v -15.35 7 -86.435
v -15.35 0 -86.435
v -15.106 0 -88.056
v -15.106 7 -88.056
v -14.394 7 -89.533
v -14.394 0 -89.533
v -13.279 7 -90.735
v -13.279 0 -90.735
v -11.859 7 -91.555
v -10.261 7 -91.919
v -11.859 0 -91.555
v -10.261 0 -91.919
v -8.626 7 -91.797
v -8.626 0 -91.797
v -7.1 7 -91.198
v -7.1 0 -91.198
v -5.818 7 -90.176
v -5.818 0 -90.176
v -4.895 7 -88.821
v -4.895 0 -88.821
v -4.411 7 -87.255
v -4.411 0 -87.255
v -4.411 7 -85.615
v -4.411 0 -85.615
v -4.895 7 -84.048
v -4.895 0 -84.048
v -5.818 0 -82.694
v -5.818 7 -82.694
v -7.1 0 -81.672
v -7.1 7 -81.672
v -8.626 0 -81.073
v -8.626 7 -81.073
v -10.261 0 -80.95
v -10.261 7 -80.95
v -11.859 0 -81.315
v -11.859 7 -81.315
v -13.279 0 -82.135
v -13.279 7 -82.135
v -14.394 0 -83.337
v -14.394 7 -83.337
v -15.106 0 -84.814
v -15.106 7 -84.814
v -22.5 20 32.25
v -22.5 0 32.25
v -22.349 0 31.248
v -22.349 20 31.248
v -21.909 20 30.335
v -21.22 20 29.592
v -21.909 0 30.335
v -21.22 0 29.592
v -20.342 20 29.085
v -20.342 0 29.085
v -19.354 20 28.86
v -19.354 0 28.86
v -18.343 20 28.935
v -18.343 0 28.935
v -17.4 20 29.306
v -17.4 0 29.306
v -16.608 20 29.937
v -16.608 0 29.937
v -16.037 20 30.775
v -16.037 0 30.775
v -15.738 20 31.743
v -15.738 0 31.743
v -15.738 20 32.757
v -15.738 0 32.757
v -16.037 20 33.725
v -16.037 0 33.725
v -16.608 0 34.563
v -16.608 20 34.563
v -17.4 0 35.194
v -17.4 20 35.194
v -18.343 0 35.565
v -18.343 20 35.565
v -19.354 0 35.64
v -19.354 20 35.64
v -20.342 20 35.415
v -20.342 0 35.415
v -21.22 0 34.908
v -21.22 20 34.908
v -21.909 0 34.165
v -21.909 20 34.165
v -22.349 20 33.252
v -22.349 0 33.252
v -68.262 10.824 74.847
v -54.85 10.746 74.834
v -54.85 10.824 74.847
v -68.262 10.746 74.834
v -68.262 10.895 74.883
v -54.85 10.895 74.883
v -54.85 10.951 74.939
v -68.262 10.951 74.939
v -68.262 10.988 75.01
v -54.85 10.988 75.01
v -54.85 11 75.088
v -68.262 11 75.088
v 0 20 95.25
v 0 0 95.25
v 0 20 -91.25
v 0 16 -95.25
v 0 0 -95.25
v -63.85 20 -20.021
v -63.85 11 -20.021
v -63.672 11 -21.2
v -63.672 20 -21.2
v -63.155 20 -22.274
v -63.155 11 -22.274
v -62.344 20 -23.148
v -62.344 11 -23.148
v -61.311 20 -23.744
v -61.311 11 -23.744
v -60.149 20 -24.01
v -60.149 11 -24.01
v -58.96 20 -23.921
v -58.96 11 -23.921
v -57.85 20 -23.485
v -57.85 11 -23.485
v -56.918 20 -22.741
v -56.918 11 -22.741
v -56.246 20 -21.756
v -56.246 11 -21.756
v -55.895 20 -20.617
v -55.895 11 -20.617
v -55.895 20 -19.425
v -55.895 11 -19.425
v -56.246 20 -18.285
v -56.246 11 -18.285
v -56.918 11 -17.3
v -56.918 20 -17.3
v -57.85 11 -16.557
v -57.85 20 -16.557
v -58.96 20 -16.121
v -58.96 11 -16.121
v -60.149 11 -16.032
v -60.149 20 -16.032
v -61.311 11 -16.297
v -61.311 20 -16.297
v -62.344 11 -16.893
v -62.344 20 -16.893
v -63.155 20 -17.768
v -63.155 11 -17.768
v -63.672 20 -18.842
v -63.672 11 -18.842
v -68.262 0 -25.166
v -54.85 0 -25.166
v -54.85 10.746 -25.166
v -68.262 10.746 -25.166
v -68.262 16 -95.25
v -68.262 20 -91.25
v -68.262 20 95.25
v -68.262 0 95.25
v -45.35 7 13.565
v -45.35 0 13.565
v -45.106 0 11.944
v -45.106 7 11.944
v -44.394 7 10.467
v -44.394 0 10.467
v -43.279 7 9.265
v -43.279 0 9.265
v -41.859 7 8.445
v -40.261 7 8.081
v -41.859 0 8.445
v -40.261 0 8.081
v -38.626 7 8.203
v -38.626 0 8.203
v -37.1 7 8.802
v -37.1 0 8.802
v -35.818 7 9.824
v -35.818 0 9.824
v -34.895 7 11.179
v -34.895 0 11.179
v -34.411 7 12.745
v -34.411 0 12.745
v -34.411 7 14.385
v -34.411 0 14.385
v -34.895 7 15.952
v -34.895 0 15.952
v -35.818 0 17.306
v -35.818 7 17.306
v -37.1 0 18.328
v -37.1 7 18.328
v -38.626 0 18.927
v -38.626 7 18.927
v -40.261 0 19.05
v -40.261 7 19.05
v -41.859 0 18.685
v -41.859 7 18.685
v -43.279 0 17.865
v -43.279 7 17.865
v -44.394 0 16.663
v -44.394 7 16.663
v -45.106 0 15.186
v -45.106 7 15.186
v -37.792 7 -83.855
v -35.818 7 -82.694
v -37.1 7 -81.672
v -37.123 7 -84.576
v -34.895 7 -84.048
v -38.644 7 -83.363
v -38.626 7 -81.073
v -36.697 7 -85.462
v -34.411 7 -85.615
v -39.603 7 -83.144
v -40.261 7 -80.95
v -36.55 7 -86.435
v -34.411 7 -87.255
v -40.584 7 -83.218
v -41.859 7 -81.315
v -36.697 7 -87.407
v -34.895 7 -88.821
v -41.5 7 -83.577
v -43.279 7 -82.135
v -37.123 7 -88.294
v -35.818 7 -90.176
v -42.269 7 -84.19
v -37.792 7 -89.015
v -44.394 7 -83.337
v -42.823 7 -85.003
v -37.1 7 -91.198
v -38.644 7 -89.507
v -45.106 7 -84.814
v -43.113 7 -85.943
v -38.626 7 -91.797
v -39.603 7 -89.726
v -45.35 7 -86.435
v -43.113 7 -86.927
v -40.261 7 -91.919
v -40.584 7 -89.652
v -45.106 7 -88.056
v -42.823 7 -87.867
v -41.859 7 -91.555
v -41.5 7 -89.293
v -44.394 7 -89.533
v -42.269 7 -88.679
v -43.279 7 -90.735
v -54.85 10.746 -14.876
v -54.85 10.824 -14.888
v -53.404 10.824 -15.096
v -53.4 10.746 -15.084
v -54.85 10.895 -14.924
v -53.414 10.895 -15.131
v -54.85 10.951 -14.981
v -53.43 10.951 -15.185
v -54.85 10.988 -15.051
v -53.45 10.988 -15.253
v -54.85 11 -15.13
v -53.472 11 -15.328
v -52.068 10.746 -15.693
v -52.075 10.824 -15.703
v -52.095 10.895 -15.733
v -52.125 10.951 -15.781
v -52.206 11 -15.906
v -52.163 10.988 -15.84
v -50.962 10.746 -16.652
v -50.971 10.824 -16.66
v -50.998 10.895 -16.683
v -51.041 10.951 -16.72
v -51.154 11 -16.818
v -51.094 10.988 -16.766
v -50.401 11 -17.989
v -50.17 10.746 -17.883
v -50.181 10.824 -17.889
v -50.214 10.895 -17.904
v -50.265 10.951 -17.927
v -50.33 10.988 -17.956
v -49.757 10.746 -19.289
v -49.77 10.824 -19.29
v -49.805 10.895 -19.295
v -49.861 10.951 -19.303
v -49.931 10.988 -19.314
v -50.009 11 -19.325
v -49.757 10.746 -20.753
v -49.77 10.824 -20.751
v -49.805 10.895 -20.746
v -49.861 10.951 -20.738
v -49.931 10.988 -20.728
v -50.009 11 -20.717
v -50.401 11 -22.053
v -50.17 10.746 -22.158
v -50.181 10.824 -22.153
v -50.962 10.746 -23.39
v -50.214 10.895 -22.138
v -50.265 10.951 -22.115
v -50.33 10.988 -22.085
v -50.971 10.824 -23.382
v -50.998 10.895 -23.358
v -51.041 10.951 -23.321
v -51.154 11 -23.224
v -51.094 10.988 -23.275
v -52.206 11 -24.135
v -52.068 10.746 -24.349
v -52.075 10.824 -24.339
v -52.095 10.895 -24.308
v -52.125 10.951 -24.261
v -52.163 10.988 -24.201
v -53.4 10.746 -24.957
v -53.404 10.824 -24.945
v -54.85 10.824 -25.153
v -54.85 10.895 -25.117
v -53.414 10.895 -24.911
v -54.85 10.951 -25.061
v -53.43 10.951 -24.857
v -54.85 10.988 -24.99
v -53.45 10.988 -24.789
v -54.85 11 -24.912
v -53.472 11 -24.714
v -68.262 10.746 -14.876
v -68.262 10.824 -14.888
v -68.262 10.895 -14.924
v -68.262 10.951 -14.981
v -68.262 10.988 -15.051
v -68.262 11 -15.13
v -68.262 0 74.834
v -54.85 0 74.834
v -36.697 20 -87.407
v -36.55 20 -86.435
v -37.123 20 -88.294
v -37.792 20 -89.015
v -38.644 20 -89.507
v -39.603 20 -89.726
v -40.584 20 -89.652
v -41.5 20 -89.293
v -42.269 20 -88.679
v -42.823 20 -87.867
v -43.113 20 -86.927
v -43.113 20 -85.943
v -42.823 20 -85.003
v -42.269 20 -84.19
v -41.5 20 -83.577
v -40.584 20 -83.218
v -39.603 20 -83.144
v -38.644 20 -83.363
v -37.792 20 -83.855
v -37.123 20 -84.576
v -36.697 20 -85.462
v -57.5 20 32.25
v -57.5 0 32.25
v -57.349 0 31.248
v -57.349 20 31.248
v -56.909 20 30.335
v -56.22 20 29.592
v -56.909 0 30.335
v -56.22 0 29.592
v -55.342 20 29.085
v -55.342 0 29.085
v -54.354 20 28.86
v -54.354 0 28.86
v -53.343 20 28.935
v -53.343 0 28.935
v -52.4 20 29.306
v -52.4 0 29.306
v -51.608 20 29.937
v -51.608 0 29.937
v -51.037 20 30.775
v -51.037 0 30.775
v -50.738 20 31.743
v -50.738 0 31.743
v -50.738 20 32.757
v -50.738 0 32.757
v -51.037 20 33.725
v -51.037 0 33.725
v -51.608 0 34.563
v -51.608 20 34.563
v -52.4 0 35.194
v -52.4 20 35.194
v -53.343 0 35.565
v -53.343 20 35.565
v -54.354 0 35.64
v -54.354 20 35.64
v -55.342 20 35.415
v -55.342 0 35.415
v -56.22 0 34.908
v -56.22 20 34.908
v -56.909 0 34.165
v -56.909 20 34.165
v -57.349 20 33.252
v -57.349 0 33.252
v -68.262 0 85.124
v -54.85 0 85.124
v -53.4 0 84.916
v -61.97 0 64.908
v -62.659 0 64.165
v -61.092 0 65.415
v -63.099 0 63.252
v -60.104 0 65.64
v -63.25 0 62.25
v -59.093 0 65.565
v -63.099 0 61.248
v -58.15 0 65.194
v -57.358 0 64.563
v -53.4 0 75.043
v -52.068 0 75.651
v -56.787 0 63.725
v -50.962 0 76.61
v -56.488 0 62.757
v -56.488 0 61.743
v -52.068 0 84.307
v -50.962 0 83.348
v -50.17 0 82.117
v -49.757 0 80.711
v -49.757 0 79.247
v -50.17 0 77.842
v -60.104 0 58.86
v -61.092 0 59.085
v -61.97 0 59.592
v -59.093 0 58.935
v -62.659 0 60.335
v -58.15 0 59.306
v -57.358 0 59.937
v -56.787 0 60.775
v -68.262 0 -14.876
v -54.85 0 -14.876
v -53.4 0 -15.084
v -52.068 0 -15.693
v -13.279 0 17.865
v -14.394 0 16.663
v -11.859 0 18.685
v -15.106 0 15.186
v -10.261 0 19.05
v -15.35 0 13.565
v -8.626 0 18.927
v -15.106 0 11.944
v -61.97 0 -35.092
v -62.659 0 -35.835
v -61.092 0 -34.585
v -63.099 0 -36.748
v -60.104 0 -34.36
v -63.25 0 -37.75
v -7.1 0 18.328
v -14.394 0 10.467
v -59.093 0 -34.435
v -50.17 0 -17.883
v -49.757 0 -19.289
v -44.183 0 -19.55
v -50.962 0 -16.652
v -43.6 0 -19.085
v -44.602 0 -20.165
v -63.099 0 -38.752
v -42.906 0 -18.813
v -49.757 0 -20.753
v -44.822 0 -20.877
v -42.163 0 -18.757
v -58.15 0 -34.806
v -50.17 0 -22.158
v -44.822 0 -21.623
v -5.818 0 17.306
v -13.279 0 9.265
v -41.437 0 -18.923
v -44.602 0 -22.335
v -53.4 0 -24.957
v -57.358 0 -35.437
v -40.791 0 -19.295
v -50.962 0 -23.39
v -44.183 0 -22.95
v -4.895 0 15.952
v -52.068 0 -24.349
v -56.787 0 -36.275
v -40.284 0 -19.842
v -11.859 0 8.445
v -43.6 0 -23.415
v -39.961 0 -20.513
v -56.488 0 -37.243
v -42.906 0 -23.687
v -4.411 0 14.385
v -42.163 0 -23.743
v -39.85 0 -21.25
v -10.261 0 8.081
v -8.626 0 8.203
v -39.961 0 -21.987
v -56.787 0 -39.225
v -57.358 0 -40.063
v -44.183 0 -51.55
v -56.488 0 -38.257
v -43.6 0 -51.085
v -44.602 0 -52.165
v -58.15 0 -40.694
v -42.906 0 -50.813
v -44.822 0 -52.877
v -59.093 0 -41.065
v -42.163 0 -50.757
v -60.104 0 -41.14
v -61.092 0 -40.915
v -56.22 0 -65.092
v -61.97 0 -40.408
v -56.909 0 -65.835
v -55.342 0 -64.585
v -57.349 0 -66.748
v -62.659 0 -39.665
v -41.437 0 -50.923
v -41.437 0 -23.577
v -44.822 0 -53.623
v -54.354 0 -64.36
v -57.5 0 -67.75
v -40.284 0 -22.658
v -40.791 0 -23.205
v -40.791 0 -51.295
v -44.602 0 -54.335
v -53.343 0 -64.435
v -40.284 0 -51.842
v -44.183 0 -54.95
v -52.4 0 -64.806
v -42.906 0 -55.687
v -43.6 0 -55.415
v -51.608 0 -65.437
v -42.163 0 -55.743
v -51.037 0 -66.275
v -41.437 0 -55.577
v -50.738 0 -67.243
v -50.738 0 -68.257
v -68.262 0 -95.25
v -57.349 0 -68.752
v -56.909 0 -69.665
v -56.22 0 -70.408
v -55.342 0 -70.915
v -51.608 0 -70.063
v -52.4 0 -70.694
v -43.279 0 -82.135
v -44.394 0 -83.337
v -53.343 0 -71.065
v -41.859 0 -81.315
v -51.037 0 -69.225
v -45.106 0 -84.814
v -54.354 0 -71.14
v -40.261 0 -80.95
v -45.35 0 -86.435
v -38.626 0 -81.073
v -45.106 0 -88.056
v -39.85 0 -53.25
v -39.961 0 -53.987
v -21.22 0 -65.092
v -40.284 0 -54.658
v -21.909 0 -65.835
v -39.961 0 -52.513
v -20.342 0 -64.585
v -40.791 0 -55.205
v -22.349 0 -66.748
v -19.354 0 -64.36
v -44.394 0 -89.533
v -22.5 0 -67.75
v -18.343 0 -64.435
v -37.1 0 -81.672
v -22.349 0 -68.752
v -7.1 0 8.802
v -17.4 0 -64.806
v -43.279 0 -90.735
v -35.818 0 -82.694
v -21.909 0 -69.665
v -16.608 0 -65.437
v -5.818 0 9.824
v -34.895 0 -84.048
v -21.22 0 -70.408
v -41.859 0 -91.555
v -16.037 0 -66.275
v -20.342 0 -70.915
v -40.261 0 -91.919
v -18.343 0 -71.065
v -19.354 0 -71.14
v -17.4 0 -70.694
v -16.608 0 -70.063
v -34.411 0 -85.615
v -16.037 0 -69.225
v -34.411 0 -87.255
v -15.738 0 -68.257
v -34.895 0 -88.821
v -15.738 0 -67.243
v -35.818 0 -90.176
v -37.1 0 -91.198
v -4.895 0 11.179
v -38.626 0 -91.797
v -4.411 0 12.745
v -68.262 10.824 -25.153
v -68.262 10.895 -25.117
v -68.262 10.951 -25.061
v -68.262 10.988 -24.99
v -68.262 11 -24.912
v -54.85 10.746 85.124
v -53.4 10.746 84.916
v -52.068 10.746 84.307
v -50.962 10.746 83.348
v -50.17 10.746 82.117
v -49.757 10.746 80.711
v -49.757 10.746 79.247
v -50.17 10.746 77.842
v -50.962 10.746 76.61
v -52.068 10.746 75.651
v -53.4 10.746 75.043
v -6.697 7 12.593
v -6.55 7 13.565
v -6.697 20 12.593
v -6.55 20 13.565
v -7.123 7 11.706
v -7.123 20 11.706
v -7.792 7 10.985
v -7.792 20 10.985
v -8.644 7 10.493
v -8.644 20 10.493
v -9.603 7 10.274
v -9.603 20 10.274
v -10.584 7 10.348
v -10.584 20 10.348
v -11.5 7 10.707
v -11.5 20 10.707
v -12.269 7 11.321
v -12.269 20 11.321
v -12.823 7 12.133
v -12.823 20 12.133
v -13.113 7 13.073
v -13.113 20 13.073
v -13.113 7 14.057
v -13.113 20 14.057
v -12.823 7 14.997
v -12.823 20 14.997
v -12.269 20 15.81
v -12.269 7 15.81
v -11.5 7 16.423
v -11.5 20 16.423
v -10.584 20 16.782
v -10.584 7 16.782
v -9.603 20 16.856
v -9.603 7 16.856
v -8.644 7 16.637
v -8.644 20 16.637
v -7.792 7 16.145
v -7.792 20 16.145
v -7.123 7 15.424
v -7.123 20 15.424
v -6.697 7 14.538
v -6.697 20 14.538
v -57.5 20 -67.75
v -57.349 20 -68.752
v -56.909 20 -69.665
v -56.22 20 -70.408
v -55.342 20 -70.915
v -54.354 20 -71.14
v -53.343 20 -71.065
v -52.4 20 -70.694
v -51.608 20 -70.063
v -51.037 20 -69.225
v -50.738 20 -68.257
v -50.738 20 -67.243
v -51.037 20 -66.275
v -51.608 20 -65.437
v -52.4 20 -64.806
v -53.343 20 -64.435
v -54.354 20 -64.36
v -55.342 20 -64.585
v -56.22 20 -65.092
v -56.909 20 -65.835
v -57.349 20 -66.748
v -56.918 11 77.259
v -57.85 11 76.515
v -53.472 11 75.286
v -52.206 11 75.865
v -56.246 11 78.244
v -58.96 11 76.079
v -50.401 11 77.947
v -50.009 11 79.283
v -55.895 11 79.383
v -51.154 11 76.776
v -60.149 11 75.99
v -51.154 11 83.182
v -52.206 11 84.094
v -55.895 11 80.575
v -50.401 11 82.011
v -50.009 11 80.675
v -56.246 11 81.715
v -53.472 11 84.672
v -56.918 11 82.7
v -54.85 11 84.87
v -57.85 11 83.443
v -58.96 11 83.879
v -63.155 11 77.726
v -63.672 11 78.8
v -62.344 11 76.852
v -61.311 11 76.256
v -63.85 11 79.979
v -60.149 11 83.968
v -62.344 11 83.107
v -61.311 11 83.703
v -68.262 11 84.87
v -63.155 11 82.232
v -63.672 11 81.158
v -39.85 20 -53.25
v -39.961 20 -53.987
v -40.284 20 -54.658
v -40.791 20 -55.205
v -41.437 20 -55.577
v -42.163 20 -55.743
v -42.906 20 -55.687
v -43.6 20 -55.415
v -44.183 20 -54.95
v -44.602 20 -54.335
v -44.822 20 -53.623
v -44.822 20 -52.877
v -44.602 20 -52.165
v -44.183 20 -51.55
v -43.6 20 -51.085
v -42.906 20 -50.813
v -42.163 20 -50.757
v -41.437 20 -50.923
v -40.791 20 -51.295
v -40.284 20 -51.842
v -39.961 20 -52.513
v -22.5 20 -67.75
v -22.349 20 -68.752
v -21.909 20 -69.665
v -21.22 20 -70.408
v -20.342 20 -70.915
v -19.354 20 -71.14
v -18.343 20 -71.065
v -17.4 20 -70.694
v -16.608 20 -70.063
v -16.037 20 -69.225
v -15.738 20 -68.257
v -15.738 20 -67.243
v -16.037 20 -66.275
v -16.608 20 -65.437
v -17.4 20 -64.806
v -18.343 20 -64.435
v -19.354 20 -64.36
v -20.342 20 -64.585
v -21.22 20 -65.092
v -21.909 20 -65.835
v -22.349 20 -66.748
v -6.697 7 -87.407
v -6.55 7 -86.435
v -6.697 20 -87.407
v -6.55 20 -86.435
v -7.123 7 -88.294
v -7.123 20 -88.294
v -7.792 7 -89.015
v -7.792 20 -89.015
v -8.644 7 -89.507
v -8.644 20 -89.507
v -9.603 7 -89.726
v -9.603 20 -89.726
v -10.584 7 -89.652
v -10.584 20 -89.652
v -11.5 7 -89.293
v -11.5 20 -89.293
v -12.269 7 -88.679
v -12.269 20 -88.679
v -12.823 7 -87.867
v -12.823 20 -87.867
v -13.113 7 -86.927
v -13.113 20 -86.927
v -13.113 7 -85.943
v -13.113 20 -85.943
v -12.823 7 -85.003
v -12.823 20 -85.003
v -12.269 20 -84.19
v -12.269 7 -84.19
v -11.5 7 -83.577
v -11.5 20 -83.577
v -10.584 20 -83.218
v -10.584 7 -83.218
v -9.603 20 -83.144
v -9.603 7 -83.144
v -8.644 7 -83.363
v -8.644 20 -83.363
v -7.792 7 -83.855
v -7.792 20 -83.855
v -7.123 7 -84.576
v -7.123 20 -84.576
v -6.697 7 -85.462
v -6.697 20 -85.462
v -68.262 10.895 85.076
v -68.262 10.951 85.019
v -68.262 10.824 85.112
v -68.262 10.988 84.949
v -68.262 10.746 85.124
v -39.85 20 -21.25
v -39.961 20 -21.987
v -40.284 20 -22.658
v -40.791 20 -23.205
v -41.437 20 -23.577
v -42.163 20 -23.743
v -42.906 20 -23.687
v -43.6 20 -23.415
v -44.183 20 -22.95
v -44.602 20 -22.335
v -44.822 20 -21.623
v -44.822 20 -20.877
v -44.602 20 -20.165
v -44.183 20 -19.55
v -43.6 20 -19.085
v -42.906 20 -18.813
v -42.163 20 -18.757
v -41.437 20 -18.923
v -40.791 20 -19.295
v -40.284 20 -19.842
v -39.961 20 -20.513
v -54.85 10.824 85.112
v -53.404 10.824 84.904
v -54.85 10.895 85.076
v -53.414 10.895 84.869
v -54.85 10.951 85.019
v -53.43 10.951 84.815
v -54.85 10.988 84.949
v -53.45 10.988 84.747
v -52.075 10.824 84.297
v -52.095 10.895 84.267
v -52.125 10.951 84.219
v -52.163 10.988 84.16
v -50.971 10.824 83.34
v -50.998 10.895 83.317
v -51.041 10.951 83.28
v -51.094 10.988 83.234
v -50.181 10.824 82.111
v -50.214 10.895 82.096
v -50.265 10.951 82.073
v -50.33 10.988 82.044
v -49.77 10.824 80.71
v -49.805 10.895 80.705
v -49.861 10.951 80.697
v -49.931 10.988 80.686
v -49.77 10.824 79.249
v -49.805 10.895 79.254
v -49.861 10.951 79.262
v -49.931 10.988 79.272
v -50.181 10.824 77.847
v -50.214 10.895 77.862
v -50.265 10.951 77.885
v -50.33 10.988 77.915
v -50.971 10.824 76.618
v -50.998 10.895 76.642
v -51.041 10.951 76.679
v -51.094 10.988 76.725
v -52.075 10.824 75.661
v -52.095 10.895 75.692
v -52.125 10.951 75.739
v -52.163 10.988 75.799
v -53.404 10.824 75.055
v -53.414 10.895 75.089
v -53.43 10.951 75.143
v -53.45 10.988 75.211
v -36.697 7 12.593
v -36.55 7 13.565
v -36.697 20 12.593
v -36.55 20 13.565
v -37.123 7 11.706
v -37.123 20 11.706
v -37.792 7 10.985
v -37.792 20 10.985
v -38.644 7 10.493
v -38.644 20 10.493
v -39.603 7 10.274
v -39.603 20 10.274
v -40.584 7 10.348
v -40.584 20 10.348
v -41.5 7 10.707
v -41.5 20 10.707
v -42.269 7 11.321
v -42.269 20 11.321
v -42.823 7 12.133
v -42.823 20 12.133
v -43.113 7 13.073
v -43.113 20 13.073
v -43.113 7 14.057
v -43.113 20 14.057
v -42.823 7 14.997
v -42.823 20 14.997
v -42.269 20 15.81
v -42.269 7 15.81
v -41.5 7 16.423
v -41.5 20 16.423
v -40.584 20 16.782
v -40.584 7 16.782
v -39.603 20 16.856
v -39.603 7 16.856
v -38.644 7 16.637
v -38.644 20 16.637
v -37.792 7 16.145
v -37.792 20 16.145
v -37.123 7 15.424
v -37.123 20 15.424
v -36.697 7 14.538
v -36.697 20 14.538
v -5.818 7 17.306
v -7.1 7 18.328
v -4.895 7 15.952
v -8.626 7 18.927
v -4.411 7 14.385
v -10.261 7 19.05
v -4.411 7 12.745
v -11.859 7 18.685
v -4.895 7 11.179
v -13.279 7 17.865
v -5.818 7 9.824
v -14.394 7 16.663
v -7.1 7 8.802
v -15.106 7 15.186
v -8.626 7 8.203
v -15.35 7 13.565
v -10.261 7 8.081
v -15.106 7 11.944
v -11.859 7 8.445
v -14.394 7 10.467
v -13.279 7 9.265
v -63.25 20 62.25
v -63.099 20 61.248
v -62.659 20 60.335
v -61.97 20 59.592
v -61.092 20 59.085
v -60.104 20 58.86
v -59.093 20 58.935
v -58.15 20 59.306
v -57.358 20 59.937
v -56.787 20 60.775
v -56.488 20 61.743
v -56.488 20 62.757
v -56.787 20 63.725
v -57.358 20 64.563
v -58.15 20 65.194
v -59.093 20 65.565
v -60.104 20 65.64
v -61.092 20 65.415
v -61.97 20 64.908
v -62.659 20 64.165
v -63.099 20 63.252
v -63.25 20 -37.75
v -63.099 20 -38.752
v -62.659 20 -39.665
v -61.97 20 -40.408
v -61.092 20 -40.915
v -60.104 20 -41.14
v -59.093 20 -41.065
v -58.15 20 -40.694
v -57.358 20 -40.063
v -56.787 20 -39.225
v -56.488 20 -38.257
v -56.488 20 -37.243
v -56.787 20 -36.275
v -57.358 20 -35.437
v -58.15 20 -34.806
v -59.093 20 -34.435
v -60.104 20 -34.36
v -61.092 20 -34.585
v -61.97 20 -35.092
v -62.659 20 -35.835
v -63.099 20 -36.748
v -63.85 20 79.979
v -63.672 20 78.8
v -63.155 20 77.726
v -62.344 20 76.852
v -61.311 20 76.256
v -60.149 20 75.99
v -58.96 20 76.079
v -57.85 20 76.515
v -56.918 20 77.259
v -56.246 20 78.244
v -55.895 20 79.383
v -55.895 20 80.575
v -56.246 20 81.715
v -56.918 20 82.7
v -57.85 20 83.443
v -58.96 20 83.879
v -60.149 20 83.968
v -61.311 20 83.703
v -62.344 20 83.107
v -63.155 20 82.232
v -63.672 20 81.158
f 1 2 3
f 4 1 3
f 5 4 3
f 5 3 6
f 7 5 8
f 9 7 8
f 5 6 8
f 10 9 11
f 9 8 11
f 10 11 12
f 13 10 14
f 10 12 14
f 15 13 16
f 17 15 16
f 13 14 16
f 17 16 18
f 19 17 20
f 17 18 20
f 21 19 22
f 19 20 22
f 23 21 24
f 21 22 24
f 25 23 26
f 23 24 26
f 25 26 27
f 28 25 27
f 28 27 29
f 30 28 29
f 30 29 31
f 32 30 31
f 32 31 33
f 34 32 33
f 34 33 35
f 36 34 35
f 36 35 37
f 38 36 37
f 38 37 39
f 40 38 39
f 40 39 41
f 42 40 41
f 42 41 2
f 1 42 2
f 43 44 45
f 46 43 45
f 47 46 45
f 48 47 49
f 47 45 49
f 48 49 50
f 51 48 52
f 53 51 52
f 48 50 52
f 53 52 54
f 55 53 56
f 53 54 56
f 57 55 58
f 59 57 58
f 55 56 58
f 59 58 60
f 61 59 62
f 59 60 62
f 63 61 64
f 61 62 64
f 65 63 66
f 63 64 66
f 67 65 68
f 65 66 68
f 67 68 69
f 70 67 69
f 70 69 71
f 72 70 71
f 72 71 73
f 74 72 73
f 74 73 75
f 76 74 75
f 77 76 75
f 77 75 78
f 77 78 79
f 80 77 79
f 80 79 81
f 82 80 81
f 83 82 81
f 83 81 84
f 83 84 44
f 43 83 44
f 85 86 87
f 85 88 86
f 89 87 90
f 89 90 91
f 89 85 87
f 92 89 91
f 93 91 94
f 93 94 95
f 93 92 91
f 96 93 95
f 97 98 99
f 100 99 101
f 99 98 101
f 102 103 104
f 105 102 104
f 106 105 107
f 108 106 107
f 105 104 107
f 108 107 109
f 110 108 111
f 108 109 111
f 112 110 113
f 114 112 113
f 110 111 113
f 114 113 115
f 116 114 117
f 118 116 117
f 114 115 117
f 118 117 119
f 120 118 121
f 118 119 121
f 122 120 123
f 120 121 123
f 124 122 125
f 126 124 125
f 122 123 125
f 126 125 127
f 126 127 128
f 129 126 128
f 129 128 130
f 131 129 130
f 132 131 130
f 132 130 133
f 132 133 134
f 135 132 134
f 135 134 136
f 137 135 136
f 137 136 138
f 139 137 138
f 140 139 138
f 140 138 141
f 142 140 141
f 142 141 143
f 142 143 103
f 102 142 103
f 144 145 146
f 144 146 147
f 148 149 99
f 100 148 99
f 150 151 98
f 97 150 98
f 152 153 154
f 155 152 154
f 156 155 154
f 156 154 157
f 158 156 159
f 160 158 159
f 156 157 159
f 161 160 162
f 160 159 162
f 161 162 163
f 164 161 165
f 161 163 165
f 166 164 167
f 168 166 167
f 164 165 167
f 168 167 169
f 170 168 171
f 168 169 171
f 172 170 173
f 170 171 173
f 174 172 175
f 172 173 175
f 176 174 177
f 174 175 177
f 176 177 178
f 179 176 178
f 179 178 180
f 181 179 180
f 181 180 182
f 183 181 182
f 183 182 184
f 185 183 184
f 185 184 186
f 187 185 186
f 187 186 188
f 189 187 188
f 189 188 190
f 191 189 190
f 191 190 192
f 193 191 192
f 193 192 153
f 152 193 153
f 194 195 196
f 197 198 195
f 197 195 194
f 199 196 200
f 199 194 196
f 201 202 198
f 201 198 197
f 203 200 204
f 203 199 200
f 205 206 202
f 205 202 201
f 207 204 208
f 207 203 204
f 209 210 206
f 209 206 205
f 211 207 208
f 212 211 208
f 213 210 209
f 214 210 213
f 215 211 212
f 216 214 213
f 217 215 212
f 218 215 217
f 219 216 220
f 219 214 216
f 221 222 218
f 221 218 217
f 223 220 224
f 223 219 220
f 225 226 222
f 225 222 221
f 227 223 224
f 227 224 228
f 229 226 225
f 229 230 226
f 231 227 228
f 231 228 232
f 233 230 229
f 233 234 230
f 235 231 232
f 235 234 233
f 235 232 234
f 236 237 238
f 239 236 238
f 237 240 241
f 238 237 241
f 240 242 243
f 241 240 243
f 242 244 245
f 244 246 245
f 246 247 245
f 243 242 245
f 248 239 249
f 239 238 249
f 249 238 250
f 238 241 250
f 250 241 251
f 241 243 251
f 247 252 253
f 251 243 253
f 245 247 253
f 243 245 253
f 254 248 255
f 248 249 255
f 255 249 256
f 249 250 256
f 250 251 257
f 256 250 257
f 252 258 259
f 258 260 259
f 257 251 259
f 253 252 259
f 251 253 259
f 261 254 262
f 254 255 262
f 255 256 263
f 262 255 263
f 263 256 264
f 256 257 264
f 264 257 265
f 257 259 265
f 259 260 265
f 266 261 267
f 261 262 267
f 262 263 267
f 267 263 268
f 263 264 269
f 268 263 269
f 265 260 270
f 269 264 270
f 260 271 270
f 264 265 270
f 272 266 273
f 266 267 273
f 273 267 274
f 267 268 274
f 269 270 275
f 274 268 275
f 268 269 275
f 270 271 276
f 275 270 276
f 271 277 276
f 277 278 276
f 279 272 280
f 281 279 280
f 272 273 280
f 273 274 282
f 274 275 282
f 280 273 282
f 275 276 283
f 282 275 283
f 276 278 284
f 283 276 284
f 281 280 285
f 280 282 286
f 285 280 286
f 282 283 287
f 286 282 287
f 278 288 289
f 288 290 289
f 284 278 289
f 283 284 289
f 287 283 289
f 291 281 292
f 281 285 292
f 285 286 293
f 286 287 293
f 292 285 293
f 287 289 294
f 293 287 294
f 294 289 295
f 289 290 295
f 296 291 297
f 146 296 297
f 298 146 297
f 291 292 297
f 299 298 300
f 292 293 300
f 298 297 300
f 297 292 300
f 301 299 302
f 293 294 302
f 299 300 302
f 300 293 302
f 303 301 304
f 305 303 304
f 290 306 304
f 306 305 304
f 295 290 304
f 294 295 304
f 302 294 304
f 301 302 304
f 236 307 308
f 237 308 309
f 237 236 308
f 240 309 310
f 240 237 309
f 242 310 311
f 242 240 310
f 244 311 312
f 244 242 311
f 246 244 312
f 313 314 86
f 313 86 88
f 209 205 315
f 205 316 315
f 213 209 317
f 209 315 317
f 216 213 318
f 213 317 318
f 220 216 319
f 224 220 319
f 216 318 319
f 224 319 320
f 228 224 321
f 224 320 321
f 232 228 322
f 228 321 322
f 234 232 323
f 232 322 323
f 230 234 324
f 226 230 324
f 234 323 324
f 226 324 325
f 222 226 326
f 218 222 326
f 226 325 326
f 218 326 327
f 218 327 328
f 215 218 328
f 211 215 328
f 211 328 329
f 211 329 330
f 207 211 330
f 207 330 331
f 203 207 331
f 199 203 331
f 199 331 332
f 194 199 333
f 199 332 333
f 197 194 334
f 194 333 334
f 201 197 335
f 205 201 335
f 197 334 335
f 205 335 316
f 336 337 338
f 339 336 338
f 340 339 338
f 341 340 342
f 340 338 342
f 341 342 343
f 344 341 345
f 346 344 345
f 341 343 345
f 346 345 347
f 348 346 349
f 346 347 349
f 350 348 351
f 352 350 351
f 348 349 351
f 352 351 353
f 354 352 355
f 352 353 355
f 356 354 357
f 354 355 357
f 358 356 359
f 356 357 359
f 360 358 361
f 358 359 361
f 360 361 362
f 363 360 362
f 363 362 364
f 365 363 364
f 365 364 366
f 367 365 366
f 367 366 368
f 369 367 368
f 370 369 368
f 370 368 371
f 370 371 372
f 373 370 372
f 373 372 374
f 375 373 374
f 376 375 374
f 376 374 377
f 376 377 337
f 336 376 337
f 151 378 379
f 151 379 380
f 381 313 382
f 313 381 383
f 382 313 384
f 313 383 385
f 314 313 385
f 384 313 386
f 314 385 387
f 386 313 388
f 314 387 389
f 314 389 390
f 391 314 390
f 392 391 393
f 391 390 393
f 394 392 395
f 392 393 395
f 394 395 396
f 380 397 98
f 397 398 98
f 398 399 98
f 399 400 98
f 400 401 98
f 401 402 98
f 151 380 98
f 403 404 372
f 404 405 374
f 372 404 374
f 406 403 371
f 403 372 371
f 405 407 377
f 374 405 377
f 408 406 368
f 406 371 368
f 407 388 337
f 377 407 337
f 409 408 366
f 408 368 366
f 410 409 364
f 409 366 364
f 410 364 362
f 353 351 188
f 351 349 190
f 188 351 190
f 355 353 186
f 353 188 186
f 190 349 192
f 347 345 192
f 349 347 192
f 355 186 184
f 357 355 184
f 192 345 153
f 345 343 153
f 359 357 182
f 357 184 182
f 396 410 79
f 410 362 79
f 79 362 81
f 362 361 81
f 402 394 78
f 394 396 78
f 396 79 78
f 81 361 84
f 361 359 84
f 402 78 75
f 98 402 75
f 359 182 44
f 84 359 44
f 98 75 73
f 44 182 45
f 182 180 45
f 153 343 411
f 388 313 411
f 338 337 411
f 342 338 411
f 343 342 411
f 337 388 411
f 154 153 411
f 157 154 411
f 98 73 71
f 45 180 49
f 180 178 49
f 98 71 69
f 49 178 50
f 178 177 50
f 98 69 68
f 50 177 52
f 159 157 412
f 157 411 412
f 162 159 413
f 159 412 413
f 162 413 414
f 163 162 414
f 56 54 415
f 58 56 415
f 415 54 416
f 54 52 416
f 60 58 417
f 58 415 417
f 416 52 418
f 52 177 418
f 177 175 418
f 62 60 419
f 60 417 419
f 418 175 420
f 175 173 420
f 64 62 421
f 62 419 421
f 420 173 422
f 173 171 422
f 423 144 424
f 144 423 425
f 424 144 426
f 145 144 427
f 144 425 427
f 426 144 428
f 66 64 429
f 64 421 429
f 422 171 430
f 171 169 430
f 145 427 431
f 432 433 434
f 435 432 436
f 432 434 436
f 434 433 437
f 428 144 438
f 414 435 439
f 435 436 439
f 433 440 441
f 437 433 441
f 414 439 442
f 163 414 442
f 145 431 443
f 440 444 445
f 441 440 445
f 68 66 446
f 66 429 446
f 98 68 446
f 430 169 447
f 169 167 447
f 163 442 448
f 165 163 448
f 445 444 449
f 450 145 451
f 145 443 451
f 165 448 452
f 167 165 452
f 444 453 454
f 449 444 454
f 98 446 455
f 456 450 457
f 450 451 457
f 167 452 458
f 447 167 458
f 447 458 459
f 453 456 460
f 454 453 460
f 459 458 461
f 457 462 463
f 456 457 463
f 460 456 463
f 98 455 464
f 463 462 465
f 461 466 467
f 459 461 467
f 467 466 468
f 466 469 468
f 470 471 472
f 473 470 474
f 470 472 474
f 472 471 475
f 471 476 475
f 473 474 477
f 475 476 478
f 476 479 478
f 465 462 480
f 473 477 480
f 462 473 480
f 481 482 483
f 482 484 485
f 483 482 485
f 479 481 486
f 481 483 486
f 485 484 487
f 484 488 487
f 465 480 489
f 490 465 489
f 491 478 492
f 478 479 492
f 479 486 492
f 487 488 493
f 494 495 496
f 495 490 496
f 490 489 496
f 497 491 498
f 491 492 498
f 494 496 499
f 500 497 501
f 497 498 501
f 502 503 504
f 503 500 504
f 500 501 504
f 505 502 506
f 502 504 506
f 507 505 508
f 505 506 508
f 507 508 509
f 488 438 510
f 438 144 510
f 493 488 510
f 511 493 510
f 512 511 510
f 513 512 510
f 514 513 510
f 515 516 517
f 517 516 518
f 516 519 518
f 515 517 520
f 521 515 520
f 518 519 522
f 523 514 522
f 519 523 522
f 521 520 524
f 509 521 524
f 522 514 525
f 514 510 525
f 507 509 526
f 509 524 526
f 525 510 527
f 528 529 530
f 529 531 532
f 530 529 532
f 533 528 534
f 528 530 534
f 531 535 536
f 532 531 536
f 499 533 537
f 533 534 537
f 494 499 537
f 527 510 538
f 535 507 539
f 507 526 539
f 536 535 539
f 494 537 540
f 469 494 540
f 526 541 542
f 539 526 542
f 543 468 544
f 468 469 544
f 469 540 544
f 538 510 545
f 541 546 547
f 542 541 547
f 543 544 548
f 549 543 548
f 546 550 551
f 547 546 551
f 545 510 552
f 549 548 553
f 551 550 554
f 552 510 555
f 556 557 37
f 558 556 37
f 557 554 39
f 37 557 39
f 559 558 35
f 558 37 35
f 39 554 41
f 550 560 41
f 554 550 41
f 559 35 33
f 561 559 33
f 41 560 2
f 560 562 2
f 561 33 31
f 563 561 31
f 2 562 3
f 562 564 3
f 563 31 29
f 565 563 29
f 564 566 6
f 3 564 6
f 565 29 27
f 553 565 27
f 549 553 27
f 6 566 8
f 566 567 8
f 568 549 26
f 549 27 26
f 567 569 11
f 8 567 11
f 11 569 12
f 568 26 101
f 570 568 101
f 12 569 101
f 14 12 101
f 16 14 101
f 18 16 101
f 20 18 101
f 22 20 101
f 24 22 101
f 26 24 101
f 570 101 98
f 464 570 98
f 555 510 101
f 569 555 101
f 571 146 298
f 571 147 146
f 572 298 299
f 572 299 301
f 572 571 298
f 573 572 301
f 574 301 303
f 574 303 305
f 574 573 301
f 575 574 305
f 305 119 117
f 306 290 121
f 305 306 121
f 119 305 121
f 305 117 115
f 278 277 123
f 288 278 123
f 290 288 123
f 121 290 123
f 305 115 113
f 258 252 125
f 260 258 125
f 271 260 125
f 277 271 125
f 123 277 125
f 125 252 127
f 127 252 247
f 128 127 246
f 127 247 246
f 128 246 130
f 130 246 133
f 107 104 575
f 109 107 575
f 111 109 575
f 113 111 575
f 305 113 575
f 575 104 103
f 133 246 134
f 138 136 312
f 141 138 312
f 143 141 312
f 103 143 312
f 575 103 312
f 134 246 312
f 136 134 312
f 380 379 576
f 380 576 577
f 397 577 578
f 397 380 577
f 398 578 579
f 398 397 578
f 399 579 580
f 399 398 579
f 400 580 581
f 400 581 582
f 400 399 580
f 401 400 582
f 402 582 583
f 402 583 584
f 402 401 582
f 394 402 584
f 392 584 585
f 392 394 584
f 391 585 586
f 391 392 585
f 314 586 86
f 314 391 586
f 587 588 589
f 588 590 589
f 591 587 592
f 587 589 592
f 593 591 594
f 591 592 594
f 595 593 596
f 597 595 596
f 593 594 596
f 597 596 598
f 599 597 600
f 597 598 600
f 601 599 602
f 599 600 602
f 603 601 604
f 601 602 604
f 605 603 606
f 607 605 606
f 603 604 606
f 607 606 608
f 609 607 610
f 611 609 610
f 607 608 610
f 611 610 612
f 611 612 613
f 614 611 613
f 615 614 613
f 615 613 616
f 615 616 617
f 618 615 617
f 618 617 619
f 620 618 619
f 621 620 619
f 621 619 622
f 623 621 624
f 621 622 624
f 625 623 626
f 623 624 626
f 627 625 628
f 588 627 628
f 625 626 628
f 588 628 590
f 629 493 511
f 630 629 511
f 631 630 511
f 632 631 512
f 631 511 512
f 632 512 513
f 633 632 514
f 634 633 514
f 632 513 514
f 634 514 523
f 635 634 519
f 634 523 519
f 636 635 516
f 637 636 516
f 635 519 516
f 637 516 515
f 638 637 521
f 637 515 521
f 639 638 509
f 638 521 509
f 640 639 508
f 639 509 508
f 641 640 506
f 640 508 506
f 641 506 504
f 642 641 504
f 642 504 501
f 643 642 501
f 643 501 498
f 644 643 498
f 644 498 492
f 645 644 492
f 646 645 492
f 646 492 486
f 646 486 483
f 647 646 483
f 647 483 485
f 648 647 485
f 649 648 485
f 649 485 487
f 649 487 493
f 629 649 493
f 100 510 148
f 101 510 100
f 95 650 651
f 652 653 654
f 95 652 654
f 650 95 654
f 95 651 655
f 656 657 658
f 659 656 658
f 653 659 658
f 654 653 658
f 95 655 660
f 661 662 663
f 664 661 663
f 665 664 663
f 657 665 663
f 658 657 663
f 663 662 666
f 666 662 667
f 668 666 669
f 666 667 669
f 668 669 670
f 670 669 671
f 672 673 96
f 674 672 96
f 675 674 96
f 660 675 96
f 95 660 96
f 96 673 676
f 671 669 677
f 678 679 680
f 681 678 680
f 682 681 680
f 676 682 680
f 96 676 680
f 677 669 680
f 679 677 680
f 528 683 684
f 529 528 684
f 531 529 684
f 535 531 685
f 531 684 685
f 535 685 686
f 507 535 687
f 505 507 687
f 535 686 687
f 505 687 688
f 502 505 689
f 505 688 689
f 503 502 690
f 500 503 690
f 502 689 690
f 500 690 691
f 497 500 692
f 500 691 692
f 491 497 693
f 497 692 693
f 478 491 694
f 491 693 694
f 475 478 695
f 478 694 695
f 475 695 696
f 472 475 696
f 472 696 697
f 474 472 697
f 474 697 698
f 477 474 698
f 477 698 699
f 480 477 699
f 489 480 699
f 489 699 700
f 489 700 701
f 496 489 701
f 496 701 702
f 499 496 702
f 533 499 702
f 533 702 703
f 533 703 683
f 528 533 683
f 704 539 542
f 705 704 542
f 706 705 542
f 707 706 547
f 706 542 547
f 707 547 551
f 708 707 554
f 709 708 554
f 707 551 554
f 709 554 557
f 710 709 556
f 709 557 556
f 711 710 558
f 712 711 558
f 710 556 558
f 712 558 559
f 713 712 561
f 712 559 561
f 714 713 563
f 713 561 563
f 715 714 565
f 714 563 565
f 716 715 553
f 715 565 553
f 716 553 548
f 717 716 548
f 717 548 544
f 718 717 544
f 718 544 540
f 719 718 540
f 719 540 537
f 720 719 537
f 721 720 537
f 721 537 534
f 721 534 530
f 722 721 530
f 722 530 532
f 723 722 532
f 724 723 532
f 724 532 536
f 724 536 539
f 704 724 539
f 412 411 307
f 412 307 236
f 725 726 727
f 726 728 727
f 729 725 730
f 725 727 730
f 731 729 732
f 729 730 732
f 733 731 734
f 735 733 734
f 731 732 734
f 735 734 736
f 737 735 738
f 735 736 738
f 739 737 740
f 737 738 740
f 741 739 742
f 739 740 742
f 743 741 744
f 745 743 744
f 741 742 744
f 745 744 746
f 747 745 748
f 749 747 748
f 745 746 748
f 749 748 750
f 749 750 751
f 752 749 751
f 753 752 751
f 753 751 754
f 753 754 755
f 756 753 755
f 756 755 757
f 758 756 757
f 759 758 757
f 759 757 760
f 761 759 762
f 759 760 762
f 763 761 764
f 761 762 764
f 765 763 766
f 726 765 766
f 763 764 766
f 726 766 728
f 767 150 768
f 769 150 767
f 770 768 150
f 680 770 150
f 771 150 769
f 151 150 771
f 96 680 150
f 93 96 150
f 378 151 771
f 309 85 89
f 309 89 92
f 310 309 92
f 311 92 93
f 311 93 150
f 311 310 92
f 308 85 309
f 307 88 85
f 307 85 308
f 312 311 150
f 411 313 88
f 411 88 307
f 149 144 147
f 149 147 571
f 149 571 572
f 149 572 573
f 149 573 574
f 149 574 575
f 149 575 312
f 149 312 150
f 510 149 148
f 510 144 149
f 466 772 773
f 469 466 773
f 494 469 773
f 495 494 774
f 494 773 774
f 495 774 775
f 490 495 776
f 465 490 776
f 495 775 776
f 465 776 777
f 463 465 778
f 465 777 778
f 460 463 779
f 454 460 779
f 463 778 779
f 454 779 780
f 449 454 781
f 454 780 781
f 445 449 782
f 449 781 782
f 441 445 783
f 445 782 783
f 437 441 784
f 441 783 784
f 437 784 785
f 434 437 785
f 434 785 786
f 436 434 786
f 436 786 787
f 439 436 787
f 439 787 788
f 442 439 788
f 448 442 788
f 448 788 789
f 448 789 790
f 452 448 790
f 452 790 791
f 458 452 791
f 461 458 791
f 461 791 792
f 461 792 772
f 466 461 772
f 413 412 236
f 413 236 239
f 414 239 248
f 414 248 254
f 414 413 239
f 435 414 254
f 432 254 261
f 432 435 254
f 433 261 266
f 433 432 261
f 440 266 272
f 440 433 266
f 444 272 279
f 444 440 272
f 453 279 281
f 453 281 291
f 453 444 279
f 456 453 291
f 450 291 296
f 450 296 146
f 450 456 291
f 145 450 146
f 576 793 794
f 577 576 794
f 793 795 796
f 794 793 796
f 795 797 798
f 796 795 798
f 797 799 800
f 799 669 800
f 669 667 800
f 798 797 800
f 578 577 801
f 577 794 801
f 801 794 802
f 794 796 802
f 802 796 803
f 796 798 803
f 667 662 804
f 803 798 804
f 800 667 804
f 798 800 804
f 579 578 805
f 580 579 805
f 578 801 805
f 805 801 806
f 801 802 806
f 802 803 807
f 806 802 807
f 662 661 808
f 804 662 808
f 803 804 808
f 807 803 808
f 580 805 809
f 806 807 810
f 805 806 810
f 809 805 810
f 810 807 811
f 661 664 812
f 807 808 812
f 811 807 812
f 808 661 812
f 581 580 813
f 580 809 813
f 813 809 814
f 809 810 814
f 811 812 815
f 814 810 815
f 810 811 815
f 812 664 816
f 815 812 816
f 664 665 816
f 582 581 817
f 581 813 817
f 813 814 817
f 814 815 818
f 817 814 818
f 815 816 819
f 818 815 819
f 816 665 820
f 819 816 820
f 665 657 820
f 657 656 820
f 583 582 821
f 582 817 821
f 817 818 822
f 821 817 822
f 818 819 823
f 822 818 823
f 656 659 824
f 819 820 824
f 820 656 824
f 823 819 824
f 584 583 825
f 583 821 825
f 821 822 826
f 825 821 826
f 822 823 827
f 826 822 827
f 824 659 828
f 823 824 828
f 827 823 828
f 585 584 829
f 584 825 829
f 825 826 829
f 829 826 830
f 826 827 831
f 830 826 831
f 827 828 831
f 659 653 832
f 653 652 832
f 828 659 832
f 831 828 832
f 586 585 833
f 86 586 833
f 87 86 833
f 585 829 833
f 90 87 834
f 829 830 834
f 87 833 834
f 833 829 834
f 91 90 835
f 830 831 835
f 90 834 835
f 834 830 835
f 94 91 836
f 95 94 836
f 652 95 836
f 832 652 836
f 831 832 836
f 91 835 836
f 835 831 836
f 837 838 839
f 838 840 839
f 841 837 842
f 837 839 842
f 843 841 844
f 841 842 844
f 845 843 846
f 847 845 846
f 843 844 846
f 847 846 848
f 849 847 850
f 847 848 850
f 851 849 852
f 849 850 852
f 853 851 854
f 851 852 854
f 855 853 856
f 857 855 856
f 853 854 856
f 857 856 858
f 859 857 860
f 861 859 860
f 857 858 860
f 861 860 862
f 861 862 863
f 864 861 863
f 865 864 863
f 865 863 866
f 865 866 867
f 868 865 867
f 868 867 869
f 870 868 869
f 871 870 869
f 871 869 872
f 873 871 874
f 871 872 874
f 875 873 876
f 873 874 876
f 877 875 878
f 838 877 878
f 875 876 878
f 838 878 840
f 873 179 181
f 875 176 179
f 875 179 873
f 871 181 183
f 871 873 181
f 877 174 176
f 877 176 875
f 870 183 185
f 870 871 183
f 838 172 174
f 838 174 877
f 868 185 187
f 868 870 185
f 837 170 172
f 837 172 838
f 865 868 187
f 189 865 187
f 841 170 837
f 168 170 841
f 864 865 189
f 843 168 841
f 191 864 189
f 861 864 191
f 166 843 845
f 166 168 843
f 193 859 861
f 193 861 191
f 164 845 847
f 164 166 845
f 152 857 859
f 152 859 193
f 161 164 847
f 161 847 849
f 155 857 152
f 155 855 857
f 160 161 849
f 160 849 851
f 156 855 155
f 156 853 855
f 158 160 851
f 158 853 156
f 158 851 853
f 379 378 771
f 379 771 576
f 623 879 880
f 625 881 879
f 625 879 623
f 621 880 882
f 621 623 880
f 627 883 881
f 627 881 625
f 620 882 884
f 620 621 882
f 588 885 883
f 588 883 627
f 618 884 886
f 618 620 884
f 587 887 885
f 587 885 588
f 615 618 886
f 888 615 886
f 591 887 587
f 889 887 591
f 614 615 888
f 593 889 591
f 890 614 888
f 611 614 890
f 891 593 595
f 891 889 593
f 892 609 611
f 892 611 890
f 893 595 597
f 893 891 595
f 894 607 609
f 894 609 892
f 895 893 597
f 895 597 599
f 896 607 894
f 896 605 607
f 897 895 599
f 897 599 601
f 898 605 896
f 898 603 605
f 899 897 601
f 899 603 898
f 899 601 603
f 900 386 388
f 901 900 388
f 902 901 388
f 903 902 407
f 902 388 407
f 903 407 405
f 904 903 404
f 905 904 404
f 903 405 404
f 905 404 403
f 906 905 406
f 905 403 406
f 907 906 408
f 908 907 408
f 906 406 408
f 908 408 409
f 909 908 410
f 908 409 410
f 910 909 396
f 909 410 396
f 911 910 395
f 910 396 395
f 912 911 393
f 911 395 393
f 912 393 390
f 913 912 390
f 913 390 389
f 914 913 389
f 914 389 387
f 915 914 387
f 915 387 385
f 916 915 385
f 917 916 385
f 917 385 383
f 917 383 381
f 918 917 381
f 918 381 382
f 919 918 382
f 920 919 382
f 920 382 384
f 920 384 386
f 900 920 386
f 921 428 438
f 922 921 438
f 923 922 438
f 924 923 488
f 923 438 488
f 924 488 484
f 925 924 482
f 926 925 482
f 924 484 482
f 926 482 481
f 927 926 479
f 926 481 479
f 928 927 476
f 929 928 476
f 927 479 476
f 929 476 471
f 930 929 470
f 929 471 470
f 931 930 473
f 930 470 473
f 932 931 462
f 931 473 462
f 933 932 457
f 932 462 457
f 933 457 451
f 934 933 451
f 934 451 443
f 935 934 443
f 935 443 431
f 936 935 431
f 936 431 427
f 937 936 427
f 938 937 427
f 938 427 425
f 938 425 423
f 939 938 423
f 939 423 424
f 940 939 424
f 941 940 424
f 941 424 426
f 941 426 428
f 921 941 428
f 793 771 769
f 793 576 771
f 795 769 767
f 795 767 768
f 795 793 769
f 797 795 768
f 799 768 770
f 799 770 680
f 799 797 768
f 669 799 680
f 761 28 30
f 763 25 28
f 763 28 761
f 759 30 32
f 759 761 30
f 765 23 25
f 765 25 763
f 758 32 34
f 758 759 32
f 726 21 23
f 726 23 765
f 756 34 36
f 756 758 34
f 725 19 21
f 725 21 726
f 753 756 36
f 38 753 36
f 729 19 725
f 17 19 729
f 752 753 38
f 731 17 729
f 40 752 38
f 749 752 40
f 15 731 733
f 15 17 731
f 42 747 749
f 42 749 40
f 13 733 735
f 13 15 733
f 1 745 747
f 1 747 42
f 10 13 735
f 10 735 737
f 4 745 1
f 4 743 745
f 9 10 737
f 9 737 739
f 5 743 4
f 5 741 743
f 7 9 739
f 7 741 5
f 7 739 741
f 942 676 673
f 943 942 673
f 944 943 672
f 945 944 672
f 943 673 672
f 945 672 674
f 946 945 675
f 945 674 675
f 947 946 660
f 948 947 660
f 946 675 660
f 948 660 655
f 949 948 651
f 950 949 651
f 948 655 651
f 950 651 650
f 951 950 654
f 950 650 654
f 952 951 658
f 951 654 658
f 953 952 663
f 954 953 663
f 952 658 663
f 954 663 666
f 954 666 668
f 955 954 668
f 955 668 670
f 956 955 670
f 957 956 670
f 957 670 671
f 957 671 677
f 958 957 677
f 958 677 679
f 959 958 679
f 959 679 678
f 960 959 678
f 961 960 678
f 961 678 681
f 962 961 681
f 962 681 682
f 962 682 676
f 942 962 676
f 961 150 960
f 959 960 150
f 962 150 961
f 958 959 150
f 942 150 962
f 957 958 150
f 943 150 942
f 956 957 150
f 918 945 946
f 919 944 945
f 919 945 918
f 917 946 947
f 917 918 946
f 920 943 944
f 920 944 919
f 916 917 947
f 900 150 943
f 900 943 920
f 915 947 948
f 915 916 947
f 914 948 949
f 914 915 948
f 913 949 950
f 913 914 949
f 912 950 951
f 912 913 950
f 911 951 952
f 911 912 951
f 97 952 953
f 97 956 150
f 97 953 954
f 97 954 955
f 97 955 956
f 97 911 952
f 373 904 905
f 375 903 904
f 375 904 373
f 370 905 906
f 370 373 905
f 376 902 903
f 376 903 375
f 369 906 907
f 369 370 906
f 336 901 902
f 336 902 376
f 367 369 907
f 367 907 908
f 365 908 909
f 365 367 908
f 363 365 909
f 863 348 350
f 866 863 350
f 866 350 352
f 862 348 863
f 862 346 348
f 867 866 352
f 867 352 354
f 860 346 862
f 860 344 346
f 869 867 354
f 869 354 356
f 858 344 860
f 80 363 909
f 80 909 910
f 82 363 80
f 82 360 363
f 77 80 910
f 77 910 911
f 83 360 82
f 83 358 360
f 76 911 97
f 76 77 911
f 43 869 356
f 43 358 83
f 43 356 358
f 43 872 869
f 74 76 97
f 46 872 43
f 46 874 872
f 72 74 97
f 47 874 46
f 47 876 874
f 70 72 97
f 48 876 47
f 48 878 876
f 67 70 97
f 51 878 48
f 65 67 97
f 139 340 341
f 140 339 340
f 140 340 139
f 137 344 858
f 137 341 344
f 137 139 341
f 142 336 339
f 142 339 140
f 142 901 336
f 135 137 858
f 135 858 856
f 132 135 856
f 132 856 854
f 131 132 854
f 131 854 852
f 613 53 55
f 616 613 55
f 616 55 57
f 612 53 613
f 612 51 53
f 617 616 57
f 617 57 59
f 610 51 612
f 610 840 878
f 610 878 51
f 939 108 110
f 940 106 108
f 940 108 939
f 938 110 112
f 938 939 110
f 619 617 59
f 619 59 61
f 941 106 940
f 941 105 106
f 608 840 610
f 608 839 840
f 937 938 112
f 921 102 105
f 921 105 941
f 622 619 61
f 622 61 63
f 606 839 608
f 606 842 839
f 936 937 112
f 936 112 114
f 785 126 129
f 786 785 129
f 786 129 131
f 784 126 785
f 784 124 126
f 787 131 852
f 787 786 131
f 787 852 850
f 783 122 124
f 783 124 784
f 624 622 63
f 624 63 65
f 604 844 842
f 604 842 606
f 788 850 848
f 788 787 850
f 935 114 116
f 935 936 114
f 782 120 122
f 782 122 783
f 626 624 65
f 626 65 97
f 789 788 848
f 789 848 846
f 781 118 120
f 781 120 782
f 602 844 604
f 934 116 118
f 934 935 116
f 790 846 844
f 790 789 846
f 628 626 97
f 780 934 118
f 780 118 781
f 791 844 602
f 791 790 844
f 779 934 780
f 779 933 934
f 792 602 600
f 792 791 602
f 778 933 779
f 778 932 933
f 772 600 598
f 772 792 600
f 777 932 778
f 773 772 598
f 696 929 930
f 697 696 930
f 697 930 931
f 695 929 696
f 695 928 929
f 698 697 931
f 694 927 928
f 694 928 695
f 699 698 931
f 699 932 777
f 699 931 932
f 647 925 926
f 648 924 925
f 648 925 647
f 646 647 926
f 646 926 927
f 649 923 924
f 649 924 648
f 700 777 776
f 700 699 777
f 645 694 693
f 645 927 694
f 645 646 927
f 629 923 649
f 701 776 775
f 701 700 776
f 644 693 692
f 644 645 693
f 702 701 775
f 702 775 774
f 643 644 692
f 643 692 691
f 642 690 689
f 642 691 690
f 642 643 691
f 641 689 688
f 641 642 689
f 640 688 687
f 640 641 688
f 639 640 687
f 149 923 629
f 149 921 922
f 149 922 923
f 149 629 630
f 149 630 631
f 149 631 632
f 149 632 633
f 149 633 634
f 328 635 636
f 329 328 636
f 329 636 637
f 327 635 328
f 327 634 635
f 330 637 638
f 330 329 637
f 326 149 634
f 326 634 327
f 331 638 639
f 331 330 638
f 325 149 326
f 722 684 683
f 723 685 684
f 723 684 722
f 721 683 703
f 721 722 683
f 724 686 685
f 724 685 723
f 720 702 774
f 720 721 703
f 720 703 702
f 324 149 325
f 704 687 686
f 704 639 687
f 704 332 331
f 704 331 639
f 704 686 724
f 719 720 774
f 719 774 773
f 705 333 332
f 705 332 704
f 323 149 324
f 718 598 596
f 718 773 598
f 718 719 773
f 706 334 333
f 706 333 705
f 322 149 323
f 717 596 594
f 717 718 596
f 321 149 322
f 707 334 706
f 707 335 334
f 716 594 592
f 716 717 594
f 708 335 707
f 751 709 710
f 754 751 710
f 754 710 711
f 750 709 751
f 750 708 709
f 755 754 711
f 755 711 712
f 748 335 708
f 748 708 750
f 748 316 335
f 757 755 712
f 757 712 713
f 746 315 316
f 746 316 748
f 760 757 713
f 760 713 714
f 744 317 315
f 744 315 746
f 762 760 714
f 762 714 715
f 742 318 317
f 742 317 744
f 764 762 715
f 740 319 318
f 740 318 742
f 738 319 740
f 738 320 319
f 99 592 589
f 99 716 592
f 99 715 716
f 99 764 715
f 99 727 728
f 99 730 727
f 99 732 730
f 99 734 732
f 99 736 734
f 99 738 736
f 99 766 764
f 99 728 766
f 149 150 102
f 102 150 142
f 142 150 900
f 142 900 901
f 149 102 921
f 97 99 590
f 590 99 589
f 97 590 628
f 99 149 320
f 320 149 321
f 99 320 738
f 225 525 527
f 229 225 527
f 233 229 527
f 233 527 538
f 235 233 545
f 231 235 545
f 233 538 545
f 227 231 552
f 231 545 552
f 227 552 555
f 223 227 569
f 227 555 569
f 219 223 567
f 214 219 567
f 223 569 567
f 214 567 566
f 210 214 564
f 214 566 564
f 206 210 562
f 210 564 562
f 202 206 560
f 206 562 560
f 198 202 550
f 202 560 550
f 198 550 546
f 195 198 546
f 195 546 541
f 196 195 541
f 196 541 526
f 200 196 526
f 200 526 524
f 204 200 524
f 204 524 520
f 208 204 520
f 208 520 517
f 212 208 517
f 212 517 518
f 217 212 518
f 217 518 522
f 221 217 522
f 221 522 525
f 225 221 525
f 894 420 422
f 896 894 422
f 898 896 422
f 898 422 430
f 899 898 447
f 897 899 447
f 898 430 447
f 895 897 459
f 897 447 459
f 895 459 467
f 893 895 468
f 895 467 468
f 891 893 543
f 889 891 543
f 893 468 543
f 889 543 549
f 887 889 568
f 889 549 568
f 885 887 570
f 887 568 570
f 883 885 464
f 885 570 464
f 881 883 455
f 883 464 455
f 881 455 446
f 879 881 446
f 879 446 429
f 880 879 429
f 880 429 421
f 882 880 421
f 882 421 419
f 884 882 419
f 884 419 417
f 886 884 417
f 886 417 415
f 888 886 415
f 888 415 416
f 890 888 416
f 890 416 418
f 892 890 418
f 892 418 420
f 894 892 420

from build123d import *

# Parameters (mm, degrees)
SKETCH1_W                                           = 68.2625
SKETCH1_H                                           = 190.5
BOSS_EXTRUDE1_DEPTH                                 = 20
CHAMFER1_SIZE                                       = 4
M8_TAPPED_HOLE1_D                                   = 6.8
F_8_0_8_DIAMETER_HOLE1_D                            = 8
CUT_EXTRUDE1_DEPTH                                  = 11
FILLET1_R                                           = 0.254
CBORE_FOR_M6_HEX_SOCKET_HEAD_CAP_SCREW1_D           = 6.6
CBORE_FOR_M6_HEX_SOCKET_HEAD_CAP_SCREW1_CBORE_D     = 11
CBORE_FOR_M6_HEX_SOCKET_HEAD_CAP_SCREW1_CBORE_DEPTH = 7
M6_TAPPED_HOLE1_D                                   = 5
M6_TAPPED_HOLE1_DEPTH                               = 27.9908
M6_TAPPED_HOLE1_TIP                                 = 1.502151548


with BuildPart() as part:
    # Sketch1 → Boss-Extrude1 (new body)
    with BuildSketch(Plane(origin=(0, 0, 0), x_dir=(1, 0, 0), z_dir=(0, 1, 0))):
        with Locations((-34.13125, 0)):
            Rectangle(SKETCH1_W, SKETCH1_H)
    extrude(amount=BOSS_EXTRUDE1_DEPTH)

    # Chamfer1
    chamfer1_edges = [part.edges().sort_by_distance(p)[0] for p in [
        (-34.13125, 20, -95.25),
    ]]
    chamfer(chamfer1_edges, length=CHAMFER1_SIZE)

    # M8 Tapped Hole1 (through all)
    with Locations(Plane(origin=(0, 20, 0), x_dir=(1, 0, 0), z_dir=(0, 1, 0))):
        with Locations((-59.85, -62.25), (-54.1, -32.25), (-19.1, -32.25), (-59.85, 37.75), (-54.1, 67.75), (-19.1, 67.75)):
            Hole(M8_TAPPED_HOLE1_D / 2)

    # Ø8.0 (8) Diameter Hole1 (through all)
    with Locations(Plane(origin=(0, 20, 0), x_dir=(1, 0, 0), z_dir=(0, 1, 0))):
        with Locations((-59.85, 20.0208), (-59.85, -79.9792)):
            Hole(F_8_0_8_DIAMETER_HOLE1_D / 2)

    # Sketch6 → Cut-Extrude1 (cut)
    with BuildSketch(Plane.XZ):
        with BuildLine():
            Line((-68.2625, 85.1242), (-54.85, 85.1242))
            ThreePointArc((-54.85, 85.1242), (-49.705, 79.9792), (-54.85, 74.8342))
            Line((-54.85, 74.8342), (-68.2625, 74.8342))
            ThreePointArc((-68.2625, 74.8342), (-73.4075, 79.9792), (-68.2625, 85.1242))
        make_face()
        with BuildLine():
            Line((-68.2625, -14.8758), (-54.85, -14.8758))
            ThreePointArc((-54.85, -14.8758), (-49.705, -20.0208), (-54.85, -25.1658))
            Line((-54.85, -25.1658), (-68.2625, -25.1658))
            ThreePointArc((-68.2625, -25.1658), (-73.4075, -20.0208), (-68.2625, -14.8758))
        make_face()
    extrude(amount=-CUT_EXTRUDE1_DEPTH, mode=Mode.SUBTRACT)

    # Fillet1
    fillet1_edges = [part.edges().sort_by_distance(p)[0] for p in [
        (-61.55625, 11, 85.1242),
        (-49.705, 11, 79.9792),
        (-61.55625, 11, 74.8342),
        (-61.55625, 11, -14.8758),
        (-49.705, 11, -20.0208),
        (-61.55625, 11, -25.1658),
    ]]
    fillet(fillet1_edges, radius=FILLET1_R)

    # CBORE for M6 Hex Socket Head Cap Screw1 (through all)
    with Locations(Plane(origin=(0, 0, 0), x_dir=(-1, 0, 0), z_dir=(0, -1, 0))):
        with Locations((9.849999954, 86.434800002), (39.849999954, 86.434800002), (39.849999954, -13.565199998), (9.849999954, -13.565199998)):
            CounterBoreHole(CBORE_FOR_M6_HEX_SOCKET_HEAD_CAP_SCREW1_D / 2, CBORE_FOR_M6_HEX_SOCKET_HEAD_CAP_SCREW1_CBORE_D / 2, CBORE_FOR_M6_HEX_SOCKET_HEAD_CAP_SCREW1_CBORE_DEPTH)

    # M6 Tapped Hole1
    with Locations(Plane(origin=(0, 0, 0), x_dir=(-1, 0, 0), z_dir=(0, -1, 0))):
        with Locations((42.35, 21.249999996), (42.35, 53.249999996)):
            Hole(M6_TAPPED_HOLE1_D / 2, depth=M6_TAPPED_HOLE1_DEPTH)
            with Locations((0, 0, -(M6_TAPPED_HOLE1_DEPTH + M6_TAPPED_HOLE1_TIP / 2))):  # 118° drill point
                Cone(0, M6_TAPPED_HOLE1_D / 2, M6_TAPPED_HOLE1_TIP, mode=Mode.SUBTRACT)


solid = part.part
